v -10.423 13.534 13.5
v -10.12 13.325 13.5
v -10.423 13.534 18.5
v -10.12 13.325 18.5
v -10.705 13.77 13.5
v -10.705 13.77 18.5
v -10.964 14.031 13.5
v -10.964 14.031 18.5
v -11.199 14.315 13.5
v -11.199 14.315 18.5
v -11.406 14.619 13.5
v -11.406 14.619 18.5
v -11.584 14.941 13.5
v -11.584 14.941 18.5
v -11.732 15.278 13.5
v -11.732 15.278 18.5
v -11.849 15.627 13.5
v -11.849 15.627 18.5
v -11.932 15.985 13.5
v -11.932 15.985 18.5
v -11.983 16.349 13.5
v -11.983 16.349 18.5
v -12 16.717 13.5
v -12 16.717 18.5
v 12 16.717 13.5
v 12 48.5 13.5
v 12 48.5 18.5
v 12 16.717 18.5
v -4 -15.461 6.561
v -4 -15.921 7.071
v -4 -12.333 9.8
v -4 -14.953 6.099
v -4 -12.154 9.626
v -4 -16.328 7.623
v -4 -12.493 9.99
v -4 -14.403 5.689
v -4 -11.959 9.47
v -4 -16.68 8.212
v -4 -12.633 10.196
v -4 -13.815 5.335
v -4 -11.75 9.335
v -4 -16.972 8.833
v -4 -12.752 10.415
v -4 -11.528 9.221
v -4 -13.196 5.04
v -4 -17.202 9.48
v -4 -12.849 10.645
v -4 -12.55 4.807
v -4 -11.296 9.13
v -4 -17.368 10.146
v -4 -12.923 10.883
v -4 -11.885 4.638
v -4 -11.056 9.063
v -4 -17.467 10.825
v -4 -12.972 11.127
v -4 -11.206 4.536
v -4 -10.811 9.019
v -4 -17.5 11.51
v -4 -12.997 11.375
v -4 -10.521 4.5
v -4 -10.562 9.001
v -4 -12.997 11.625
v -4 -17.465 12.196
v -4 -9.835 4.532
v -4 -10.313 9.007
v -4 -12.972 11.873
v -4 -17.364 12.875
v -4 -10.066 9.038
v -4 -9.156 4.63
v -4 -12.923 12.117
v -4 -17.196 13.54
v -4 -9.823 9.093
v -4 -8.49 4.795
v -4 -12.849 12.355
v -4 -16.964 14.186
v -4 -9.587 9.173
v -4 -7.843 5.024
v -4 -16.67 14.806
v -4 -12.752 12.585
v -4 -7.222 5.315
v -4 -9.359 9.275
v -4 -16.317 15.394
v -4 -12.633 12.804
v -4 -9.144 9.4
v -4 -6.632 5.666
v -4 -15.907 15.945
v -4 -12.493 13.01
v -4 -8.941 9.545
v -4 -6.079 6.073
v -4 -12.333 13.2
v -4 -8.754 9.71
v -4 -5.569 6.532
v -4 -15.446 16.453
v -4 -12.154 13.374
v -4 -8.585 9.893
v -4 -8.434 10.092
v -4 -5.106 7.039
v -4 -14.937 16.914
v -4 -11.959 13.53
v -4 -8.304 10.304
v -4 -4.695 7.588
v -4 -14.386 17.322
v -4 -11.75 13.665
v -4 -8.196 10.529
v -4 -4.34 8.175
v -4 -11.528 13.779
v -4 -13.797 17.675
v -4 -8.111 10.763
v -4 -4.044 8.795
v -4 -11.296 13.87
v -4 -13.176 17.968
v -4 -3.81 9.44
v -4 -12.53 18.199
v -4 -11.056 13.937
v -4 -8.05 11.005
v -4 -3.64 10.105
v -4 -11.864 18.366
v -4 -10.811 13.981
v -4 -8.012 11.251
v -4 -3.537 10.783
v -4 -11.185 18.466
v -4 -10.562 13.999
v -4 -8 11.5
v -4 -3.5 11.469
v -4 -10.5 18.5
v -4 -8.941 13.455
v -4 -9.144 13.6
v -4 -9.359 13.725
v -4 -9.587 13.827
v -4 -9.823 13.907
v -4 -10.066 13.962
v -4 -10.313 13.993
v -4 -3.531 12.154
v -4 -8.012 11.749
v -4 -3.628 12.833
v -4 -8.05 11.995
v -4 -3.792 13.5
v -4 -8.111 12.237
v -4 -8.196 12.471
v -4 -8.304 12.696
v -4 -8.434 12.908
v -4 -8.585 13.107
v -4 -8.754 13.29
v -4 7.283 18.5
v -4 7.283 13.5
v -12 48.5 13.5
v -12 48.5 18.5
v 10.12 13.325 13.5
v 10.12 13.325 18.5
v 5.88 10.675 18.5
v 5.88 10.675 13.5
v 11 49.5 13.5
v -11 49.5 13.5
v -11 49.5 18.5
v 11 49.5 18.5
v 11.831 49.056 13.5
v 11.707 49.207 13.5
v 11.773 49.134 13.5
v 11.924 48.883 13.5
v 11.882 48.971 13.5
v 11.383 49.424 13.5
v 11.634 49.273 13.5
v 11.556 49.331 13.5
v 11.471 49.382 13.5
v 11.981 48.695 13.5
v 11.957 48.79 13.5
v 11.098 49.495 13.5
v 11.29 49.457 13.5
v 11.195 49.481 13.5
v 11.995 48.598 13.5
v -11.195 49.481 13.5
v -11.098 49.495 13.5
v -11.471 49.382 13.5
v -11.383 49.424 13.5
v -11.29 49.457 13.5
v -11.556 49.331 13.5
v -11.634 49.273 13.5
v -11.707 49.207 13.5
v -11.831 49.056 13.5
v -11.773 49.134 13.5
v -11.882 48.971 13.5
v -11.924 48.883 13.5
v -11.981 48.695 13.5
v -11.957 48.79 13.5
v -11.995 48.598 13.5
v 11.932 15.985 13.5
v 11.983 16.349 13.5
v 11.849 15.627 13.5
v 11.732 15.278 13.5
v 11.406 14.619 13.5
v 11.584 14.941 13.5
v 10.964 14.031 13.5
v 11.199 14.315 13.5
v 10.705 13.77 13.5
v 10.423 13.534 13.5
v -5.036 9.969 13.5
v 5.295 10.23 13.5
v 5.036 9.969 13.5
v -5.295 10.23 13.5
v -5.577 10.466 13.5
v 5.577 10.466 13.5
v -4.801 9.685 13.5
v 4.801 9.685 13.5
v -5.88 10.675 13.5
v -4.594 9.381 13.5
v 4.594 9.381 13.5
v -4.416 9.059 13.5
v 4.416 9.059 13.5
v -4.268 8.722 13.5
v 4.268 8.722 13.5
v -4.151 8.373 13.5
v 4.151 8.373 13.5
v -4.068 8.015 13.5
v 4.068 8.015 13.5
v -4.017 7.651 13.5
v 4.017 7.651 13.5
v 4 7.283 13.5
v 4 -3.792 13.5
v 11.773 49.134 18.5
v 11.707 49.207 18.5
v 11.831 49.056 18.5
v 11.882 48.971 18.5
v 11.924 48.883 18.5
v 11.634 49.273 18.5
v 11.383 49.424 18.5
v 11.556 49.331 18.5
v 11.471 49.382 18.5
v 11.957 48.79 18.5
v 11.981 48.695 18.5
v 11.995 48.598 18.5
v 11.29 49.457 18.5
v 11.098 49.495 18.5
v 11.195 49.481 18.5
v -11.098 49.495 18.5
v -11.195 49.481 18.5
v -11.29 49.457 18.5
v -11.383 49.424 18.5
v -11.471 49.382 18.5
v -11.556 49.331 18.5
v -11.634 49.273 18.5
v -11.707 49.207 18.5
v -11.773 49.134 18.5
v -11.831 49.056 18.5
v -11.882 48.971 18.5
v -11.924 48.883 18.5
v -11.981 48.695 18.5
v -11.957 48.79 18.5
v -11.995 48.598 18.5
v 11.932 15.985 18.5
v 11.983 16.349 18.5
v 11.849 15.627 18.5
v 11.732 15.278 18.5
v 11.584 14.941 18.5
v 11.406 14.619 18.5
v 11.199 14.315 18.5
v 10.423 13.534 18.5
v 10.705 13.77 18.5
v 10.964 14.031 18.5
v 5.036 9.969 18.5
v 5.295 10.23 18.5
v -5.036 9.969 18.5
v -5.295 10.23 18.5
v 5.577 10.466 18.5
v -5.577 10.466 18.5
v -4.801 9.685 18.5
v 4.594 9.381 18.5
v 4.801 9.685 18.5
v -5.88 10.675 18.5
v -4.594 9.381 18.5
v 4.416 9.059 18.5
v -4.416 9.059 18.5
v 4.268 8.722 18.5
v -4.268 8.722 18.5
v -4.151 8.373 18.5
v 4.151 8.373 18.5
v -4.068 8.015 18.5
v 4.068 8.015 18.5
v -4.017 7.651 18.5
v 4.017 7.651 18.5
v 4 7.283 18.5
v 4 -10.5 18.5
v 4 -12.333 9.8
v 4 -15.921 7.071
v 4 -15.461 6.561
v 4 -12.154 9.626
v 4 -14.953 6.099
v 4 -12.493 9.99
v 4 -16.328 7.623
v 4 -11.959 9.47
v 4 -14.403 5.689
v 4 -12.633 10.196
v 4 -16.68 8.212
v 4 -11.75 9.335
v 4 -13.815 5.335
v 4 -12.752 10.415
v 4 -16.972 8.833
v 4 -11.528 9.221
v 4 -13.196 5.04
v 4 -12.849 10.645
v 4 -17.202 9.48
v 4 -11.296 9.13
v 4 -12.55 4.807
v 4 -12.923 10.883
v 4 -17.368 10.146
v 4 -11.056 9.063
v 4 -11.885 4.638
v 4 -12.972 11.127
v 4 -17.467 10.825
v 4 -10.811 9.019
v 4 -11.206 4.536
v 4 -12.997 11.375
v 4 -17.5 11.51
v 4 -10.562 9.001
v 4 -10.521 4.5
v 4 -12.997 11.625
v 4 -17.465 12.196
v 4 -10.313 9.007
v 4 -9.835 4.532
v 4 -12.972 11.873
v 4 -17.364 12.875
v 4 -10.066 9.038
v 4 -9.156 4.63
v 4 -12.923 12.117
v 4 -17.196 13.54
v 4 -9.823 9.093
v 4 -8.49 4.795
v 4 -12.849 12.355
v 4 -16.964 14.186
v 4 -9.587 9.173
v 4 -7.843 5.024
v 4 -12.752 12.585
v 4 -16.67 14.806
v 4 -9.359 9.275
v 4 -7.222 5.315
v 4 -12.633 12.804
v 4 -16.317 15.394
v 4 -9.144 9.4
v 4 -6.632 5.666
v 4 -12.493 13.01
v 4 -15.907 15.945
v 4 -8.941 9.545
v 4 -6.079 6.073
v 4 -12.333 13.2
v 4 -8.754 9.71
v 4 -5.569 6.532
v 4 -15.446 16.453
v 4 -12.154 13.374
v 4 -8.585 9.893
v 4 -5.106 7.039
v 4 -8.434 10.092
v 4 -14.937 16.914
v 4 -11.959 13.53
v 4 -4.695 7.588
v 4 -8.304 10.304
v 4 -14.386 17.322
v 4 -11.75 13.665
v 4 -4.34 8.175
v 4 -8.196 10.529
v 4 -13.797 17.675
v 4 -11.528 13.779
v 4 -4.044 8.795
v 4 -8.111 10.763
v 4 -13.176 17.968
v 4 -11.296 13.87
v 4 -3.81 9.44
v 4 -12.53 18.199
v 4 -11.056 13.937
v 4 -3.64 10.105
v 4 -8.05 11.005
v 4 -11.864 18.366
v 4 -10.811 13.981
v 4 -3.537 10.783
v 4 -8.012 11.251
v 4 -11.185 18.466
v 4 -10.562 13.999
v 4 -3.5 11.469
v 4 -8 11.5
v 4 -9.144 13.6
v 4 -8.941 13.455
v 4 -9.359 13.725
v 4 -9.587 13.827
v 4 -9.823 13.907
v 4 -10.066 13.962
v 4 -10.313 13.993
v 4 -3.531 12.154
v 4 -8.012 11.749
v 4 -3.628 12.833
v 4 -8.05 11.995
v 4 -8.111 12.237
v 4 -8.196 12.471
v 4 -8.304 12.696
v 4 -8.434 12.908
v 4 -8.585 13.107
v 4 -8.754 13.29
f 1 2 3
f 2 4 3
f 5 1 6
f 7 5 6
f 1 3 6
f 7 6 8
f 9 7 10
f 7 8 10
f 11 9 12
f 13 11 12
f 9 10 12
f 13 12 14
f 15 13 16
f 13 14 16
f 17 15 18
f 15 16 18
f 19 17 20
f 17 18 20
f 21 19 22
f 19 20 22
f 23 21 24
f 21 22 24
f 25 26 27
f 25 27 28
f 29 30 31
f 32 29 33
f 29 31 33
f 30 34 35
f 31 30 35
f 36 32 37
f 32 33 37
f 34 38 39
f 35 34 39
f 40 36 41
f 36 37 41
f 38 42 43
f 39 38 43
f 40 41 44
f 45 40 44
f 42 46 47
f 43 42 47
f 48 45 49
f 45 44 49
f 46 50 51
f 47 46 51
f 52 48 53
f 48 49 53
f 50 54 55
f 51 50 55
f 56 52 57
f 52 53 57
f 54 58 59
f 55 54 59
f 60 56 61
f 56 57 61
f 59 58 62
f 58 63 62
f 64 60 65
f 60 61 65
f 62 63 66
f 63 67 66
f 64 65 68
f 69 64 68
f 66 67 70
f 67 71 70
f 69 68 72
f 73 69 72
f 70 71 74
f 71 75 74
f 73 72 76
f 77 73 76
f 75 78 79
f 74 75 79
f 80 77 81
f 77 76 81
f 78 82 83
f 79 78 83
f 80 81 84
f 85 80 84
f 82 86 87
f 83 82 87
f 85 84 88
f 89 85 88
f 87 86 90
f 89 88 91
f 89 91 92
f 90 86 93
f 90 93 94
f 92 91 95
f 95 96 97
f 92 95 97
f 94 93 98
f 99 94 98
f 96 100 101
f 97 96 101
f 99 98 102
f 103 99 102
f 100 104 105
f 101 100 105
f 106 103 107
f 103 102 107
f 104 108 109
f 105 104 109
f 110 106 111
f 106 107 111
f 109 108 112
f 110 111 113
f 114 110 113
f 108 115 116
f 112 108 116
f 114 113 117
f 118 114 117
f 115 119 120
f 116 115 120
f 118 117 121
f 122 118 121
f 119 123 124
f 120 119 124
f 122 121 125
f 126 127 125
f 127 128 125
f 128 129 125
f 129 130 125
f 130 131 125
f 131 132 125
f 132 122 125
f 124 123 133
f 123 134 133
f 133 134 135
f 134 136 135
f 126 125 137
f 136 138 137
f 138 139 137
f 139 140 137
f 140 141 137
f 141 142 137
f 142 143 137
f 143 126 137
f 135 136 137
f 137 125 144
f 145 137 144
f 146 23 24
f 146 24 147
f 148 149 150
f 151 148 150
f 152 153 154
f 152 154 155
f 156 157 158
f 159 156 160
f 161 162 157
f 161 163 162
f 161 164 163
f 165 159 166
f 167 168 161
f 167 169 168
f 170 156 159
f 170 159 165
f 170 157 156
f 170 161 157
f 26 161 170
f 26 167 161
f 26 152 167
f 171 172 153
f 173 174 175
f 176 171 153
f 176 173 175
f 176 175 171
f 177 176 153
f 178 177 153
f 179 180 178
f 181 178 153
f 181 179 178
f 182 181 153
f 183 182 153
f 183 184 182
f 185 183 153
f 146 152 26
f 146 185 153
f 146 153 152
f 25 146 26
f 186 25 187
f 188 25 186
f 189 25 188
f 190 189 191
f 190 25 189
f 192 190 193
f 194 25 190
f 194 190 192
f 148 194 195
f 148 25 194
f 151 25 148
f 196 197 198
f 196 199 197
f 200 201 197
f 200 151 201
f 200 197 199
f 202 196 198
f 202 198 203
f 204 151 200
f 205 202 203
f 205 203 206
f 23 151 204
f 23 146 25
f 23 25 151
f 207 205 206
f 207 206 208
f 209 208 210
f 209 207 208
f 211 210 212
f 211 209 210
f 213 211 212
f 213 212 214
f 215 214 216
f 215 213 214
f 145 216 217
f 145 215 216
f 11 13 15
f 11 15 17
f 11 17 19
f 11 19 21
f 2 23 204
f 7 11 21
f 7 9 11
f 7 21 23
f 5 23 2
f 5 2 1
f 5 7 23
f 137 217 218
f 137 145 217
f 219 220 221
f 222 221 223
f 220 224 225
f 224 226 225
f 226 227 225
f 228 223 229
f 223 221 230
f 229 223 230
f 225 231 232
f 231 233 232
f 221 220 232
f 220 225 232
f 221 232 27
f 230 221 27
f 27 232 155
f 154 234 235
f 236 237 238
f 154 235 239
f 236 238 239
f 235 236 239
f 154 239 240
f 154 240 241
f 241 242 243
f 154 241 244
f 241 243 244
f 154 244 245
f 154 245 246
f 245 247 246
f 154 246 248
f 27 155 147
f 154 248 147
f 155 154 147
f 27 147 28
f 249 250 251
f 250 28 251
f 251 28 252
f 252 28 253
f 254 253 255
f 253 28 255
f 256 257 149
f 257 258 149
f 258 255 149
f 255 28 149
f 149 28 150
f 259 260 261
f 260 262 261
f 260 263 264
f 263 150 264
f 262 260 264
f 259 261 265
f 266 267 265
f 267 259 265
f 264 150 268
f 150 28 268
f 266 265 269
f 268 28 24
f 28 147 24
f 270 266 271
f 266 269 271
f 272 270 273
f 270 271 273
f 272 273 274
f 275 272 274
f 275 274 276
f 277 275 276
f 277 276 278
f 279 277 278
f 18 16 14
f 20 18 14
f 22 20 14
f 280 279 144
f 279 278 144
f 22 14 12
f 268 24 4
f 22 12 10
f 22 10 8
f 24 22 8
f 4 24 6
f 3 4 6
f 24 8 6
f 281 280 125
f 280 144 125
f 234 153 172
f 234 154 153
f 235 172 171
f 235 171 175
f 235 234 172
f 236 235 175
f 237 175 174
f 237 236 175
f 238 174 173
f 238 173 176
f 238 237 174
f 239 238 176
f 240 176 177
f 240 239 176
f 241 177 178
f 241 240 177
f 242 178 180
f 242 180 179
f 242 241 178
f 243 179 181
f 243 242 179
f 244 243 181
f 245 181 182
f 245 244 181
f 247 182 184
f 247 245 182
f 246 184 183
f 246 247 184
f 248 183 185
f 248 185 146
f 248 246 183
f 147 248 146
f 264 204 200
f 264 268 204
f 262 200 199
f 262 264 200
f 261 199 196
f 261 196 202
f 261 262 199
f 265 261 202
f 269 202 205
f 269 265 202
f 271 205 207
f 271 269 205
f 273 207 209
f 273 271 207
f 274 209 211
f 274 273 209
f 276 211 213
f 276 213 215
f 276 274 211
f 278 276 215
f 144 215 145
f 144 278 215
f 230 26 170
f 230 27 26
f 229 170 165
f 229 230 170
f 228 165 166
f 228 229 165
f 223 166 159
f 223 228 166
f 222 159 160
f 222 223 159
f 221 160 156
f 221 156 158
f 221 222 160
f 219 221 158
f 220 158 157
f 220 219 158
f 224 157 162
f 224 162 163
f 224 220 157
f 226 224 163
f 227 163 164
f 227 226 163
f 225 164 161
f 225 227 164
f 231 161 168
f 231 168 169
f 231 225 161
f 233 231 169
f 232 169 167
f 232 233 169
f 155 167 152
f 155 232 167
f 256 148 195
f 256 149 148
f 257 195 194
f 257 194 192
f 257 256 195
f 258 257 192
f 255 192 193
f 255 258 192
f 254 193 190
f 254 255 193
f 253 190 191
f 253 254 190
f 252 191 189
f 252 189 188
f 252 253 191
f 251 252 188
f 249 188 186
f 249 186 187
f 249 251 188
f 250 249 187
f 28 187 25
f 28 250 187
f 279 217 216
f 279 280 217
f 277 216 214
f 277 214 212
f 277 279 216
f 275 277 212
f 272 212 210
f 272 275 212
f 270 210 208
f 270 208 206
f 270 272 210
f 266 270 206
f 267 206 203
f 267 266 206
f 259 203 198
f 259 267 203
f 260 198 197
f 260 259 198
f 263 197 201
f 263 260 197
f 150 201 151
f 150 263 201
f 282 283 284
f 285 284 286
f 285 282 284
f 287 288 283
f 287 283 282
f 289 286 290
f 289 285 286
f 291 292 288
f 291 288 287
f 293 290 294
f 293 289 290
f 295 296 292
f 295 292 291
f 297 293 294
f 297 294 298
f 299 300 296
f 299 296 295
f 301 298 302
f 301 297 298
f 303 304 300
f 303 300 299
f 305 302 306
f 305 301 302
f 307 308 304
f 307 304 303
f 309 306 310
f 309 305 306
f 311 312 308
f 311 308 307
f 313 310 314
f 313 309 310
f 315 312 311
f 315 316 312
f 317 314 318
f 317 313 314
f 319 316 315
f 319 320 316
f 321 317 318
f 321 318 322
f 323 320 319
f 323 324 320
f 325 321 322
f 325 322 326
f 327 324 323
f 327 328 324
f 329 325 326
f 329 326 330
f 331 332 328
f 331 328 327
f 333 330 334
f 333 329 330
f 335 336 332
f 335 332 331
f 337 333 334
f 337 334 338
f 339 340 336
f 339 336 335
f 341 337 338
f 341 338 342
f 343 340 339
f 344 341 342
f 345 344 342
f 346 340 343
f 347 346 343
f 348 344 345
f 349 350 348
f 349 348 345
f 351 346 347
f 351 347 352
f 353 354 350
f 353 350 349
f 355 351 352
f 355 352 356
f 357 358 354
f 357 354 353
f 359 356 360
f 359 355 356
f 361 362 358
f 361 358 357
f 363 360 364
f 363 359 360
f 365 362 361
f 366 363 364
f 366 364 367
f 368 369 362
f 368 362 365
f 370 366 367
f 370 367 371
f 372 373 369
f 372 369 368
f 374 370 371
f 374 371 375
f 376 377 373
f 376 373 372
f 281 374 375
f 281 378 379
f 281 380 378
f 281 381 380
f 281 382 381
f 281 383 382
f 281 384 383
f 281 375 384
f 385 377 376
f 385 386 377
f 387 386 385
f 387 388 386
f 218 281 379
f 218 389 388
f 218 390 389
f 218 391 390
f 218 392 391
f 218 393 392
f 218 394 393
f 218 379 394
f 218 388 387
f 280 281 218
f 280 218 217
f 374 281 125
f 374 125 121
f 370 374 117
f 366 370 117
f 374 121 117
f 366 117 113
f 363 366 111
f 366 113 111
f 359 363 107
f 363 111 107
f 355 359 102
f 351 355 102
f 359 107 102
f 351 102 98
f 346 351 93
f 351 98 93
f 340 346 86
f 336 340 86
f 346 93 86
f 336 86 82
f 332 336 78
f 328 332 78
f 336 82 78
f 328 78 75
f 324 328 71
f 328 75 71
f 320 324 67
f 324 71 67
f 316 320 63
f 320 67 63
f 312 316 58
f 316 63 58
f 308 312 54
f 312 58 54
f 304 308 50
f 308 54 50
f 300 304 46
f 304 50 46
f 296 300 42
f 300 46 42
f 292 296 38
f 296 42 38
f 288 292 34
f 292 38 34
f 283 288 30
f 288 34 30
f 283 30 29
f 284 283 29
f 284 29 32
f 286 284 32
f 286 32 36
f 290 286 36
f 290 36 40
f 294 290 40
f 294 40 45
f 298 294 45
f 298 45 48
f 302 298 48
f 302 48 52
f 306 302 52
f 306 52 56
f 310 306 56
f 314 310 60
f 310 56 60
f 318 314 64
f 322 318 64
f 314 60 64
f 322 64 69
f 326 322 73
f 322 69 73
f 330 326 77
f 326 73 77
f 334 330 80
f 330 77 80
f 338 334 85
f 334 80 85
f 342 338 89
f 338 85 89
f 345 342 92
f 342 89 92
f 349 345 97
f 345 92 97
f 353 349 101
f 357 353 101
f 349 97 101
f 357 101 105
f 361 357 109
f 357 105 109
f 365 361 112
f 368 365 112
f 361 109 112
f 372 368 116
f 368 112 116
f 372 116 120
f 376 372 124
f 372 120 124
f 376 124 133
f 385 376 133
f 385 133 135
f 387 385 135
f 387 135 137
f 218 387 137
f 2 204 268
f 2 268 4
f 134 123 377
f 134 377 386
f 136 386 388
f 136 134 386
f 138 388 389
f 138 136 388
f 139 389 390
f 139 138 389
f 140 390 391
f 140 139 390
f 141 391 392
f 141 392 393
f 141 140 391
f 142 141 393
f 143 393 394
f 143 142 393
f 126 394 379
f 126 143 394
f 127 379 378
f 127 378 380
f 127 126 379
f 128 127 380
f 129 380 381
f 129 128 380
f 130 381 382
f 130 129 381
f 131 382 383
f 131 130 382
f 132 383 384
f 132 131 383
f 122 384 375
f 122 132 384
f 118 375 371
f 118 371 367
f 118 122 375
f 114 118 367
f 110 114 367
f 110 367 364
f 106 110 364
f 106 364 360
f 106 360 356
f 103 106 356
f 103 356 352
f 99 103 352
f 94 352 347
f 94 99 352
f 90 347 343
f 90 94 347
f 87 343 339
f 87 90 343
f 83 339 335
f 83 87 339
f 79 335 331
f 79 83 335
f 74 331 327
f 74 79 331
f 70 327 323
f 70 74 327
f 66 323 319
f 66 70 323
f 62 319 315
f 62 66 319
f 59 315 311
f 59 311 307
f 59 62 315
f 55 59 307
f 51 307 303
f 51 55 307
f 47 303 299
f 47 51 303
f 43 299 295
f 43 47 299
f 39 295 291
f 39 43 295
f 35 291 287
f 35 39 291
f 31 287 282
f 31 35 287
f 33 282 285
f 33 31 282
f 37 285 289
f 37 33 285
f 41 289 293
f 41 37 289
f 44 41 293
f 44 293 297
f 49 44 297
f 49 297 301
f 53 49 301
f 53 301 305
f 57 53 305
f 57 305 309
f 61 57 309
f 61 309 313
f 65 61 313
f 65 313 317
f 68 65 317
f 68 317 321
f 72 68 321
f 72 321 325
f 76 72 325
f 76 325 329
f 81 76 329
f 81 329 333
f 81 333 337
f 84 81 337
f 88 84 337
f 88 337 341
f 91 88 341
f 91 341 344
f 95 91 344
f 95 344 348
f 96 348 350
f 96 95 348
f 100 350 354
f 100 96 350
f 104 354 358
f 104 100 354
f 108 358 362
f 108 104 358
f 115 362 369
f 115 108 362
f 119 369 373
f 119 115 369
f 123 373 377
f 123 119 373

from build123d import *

# Parameters (mm, degrees)
SKETCH006_R             = 2.5
PAD005_DEPTH            = 8
PAD006_DEPTH            = 5
FILLET_R                = 4
FILLET001_R             = 1
BODY001_PLACEMENT_ANGLE = 90


with BuildPart() as part:
    # Sketch006 → Pad005 (new body)
    with BuildSketch(Plane.XZ):
        with BuildLine():
            ThreePointArc((0, 7), (-4.1833, -5.612486), (6.708204, 2))
            Line((60, 2), (6.708204, 2))
            Line((60, 7), (60, 2))
            Line((0, 7), (60, 7))
        make_face()
        Circle(SKETCH006_R, mode=Mode.SUBTRACT)
    extrude(amount=PAD005_DEPTH)

    # Sketch007 (on Face4 of Pad005) → Pad006 (join)
    with BuildSketch(Plane.XY.offset(2)):
        Polygon((20, 0), (25, 8), (60, 8), (60, -16), (25, -16), (20, -8), align=None)
    extrude(amount=PAD006_DEPTH)

    # Fillet
    fillet_edges = [part.edges().sort_by_distance(p)[0] for p in [
        (25, 8, 4.5),
        (25, -16, 4.5),
        (20, -8, 4.5),
        (20, 0, 4.5),
    ]]
    fillet(fillet_edges, radius=FILLET_R)

    # Fillet001
    fillet001_edges = [part.edges().sort_by_distance(p)[0] for p in [
        (60, 8, 4.5),
        (60, -16, 4.5),
    ]]
    fillet(fillet001_edges, radius=FILLET001_R)


with BuildPart() as part_1:
    # Body001 placement: moved
    add(part.part.moved(Location((-4, -10.5, 11.5))).rotate(Axis((-4, -10.5, 11.5), (0, 0, 1)), BODY001_PLACEMENT_ANGLE))


solid = part_1.part
